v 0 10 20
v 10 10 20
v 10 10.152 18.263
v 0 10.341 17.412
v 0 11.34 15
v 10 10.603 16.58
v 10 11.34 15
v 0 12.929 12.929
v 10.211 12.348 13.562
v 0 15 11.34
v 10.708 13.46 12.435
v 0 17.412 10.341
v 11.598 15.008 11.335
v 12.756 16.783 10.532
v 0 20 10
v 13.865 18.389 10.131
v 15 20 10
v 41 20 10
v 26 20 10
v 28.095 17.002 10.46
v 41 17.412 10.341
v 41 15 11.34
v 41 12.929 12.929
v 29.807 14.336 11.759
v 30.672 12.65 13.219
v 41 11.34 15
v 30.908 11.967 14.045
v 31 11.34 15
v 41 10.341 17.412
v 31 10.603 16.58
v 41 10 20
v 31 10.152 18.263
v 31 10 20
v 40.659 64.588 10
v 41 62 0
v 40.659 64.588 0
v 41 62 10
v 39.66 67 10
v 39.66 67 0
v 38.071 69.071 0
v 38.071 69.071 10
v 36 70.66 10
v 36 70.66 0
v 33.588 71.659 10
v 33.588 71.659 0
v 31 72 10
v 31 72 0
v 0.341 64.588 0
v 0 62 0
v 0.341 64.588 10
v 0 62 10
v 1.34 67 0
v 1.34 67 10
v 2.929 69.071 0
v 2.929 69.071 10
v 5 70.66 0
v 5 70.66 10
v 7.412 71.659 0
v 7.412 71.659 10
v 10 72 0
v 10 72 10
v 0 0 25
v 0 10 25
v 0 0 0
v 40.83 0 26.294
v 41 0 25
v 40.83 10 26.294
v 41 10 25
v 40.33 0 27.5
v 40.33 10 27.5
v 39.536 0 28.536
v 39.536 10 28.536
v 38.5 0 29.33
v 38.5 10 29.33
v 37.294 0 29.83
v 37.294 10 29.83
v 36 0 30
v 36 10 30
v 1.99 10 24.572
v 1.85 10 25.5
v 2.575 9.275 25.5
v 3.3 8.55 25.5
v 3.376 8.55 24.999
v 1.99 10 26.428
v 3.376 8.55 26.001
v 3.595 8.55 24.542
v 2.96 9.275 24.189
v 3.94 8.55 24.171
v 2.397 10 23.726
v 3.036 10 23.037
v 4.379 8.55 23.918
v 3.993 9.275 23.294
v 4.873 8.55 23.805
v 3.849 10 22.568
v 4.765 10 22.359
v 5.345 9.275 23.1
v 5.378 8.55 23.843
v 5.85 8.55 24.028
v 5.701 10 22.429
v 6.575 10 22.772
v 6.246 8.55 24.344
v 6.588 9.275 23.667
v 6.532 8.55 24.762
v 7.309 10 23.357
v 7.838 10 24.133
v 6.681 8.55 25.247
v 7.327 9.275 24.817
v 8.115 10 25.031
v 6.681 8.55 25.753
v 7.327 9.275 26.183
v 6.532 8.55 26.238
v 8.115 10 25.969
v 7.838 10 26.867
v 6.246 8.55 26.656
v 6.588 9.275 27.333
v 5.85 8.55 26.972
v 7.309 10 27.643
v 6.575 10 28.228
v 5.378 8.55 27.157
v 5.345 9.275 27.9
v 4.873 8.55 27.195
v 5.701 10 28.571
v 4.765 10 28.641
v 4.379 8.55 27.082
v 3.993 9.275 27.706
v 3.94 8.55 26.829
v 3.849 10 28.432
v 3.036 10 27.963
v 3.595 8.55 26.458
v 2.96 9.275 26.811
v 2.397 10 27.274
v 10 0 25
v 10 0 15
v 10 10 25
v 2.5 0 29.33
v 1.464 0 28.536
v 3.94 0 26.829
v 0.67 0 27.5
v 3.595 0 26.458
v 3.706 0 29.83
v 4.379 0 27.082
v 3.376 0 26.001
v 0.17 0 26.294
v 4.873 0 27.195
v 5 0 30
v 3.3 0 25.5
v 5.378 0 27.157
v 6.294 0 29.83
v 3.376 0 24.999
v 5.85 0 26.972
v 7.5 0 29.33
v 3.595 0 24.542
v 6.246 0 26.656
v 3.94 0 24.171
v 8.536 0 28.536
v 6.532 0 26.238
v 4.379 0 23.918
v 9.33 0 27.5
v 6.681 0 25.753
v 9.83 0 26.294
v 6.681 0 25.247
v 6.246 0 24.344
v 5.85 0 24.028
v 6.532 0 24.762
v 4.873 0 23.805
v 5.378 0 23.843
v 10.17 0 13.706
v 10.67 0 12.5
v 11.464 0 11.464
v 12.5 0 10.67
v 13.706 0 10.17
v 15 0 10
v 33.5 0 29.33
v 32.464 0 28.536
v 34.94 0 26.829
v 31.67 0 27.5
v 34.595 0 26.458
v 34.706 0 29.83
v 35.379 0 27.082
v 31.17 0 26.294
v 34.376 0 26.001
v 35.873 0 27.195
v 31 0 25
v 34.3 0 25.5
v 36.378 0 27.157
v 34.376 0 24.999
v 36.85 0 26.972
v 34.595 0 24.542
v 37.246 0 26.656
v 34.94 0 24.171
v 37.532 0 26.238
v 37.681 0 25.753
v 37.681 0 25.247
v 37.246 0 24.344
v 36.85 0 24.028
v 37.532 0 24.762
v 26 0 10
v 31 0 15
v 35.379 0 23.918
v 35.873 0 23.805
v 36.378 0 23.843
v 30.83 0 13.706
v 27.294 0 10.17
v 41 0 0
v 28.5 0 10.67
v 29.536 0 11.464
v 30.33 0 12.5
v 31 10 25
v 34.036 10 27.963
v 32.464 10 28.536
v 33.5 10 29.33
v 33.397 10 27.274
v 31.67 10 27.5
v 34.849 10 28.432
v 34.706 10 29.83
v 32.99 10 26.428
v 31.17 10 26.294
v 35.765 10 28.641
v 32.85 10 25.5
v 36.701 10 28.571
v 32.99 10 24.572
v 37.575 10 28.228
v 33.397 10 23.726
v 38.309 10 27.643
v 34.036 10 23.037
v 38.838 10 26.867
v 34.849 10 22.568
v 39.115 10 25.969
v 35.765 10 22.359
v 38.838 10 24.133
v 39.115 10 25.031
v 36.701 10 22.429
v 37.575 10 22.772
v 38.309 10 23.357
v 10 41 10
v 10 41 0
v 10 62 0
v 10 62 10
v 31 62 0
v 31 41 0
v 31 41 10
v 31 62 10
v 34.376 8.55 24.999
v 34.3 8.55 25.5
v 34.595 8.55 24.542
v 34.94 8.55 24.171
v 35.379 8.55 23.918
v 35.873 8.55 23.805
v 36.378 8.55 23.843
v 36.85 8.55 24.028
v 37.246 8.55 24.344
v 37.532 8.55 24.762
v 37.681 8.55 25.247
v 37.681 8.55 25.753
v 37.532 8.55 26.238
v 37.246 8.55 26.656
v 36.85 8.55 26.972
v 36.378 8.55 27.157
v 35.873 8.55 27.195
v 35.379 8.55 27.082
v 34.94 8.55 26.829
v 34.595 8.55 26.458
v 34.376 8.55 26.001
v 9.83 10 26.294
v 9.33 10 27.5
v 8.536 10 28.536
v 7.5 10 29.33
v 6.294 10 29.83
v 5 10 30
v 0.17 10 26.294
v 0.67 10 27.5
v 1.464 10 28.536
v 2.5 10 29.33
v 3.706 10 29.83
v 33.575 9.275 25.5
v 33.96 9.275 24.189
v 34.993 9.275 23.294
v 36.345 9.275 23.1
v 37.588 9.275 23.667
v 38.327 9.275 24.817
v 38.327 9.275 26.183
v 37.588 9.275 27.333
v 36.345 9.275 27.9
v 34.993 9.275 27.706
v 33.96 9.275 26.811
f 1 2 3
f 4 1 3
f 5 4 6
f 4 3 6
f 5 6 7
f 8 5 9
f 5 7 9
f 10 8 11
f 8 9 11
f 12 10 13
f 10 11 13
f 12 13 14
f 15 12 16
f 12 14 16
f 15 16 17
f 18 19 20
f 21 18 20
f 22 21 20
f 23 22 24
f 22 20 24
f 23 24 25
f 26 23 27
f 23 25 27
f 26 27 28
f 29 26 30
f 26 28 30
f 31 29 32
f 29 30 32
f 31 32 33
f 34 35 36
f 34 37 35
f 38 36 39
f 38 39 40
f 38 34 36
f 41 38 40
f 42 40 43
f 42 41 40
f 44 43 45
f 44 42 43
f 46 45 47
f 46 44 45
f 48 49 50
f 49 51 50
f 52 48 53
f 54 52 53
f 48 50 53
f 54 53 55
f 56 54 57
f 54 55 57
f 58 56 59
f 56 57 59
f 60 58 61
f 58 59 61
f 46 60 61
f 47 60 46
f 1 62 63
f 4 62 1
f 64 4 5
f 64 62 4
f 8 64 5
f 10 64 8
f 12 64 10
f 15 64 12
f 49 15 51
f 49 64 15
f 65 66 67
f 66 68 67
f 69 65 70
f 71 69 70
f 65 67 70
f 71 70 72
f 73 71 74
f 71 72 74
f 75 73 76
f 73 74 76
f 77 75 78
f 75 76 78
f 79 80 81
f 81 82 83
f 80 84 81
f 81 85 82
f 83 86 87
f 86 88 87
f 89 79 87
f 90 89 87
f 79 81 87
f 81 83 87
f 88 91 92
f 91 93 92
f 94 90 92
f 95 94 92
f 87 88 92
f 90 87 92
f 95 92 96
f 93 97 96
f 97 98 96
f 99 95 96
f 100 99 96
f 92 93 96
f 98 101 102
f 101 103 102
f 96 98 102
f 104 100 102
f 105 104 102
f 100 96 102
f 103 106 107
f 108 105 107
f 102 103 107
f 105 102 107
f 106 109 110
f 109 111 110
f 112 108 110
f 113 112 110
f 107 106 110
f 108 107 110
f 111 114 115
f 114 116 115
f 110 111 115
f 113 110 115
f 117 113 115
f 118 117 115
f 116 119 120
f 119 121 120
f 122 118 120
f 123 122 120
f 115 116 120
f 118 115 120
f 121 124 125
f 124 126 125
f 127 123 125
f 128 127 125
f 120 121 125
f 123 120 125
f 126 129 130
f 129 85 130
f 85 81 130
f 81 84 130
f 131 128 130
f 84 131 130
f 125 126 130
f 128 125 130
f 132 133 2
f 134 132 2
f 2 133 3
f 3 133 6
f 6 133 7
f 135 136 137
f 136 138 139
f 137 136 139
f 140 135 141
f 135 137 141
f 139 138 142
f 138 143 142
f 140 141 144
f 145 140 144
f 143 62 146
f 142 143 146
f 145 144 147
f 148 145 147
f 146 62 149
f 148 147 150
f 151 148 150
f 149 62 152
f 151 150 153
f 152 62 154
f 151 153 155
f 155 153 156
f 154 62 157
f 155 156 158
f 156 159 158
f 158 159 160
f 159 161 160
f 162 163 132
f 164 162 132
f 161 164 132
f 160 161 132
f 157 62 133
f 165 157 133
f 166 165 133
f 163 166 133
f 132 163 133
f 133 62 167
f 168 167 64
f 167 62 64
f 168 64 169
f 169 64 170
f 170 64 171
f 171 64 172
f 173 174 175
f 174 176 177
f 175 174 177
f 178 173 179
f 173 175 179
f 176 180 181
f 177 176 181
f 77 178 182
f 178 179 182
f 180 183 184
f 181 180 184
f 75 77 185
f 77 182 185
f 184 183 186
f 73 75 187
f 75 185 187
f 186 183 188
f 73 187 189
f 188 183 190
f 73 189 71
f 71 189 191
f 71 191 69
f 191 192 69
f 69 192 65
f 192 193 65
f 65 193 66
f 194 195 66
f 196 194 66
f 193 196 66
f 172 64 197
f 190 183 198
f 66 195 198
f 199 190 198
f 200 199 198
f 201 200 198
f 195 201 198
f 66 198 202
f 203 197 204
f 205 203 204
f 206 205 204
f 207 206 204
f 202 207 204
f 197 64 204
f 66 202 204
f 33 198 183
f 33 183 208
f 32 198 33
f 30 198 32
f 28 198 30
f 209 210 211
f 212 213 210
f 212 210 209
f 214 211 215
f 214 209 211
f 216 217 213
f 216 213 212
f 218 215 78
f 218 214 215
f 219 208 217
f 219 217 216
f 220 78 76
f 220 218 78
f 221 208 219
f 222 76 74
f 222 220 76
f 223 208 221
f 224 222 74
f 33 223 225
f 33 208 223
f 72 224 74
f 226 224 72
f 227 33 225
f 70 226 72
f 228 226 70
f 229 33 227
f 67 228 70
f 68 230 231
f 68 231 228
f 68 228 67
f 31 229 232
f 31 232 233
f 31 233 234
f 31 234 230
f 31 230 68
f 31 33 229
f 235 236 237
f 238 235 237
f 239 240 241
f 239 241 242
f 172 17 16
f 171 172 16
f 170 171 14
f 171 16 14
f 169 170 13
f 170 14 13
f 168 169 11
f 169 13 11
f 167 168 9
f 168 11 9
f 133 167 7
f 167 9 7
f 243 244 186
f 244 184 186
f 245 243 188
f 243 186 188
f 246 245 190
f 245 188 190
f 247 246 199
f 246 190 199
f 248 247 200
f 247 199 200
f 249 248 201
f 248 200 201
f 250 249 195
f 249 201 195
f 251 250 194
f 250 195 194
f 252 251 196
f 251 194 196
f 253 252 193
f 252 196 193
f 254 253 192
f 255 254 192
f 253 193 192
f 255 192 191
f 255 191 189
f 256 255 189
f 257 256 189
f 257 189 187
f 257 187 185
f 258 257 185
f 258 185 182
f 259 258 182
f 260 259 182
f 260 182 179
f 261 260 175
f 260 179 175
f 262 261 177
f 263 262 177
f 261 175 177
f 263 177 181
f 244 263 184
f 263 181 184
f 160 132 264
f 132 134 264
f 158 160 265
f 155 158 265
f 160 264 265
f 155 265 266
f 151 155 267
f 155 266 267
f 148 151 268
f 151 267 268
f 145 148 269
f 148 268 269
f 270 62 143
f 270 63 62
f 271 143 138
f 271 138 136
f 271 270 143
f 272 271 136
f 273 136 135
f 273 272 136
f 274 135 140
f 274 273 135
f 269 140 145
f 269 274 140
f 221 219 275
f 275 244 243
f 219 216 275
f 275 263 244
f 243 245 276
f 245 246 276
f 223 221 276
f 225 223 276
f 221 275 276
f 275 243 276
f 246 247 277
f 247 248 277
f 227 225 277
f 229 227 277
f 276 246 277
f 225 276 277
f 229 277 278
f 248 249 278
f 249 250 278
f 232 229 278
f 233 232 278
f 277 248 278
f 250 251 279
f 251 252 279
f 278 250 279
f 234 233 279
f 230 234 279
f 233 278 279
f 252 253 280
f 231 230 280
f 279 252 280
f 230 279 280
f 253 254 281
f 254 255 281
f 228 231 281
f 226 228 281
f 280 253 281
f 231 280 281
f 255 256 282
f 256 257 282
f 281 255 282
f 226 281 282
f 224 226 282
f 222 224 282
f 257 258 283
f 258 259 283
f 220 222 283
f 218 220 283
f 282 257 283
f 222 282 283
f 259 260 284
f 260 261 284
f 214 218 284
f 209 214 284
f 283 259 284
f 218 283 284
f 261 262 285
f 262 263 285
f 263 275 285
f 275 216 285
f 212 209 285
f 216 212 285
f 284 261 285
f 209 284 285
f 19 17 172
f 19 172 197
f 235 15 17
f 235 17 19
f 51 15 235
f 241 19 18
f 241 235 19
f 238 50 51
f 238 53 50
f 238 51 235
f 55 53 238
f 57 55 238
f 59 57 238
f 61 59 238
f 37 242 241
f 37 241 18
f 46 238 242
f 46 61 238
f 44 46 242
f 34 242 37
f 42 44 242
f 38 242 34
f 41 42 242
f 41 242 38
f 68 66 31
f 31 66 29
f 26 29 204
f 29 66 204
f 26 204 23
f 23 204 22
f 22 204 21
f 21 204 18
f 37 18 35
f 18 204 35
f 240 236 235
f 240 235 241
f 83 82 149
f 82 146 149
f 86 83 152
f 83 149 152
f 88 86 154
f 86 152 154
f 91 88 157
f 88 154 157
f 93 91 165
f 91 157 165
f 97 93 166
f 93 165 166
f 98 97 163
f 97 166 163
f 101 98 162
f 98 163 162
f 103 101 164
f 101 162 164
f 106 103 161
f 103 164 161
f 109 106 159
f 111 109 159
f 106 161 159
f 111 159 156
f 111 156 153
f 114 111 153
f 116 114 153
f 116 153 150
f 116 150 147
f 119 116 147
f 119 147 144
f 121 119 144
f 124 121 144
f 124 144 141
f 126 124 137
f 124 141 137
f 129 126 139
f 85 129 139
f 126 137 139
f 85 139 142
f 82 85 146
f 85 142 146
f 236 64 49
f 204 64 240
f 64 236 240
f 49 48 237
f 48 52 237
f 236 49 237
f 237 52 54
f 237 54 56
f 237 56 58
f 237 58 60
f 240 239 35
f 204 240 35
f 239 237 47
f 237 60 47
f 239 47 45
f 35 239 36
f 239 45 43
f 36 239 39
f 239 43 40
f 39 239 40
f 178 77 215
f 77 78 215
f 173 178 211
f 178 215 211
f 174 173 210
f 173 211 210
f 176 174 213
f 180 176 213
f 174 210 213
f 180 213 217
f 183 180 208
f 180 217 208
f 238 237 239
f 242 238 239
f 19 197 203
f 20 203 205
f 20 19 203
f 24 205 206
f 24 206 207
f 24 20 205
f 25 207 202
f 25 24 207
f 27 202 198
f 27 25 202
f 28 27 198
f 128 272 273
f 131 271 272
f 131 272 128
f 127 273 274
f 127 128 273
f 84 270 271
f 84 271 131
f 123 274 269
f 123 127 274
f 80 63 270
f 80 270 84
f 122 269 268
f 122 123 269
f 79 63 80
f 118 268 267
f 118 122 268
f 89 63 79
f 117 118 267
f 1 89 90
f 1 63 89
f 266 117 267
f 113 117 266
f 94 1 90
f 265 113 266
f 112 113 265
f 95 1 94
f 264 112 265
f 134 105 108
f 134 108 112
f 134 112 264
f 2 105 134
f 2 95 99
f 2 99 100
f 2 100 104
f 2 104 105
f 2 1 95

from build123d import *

# Parameters (mm, degrees)
ESQUISSE1_W                                    = 41
ESQUISSE1_H                                    = 72
ESQUISSE1_W_2                                  = 21
ESQUISSE1_H_2                                  = 21
BOSS_EXTRU_1_DEPTH                             = 10
ESQUISSE3_W                                    = 10
ESQUISSE3_H                                    = 10
BOSS_EXTRU_2_DEPTH                             = 20
FRAISAGE_POUR_VIS_T_TE_FRAIS_E_M31_D           = 3.4
FRAISAGE_POUR_VIS_T_TE_FRAIS_E_M31_CSINK_D     = 6.3
FRAISAGE_POUR_VIS_T_TE_FRAIS_E_M31_CSINK_ANGLE = 90
CONG_2_R                                       = 10
CONG_3_R                                       = 5
CONG_4_R                                       = 10


with BuildPart() as part:
    # Esquisse1 → Boss.-Extru.1 (new body)
    with BuildSketch(Plane.XY):
        with Locations((20.5, 36)):
            Rectangle(ESQUISSE1_W, ESQUISSE1_H)
        with Locations((20.5, 51.5)):
            Rectangle(ESQUISSE1_W_2, ESQUISSE1_H_2, mode=Mode.SUBTRACT)
    extrude(amount=BOSS_EXTRU_1_DEPTH)

    # Esquisse3 → Boss.-Extru.2 (add)
    with BuildSketch(Plane.XY.offset(10)):
        with Locations((36, 5)):
            Rectangle(ESQUISSE3_W, ESQUISSE3_H)
        with Locations((5, 5)):
            Rectangle(ESQUISSE3_W, ESQUISSE3_H)
    extrude(amount=BOSS_EXTRU_2_DEPTH)

    # Fraisage pour vis à tête fraisée M31 (through all)
    with Locations(Plane(origin=(0, 10, 0), x_dir=(1, 0, 0), z_dir=(0, 1, 0))):
        with Locations((5, -25.5), (36, -25.5)):
            CounterSinkHole(FRAISAGE_POUR_VIS_T_TE_FRAIS_E_M31_D / 2, FRAISAGE_POUR_VIS_T_TE_FRAIS_E_M31_CSINK_D / 2, counter_sink_angle=FRAISAGE_POUR_VIS_T_TE_FRAIS_E_M31_CSINK_ANGLE)

    # Congé2
    cong_2_edges = [part.edges().sort_by_distance(p)[0] for p in [
        (0, 72, 5),
        (41, 72, 5),
    ]]
    fillet(cong_2_edges, radius=CONG_2_R)

    # Congé3
    cong_3_edges = [part.edges().sort_by_distance(p)[0] for p in [
        (10, 5, 10),
        (31, 5, 10),
        (41, 5, 30),
        (31, 5, 30),
        (10, 5, 30),
        (0, 5, 30),
    ]]
    fillet(cong_3_edges, radius=CONG_3_R - 0.0001)  # a hair under: the kernel refuses the full size

    # Congé4
    cong_4_edges = [part.edges().sort_by_distance(p)[0] for p in [
        (33.50005, 10, 10),
        (7.49995, 10, 10),
    ]]
    fillet(cong_4_edges, radius=CONG_4_R)


solid = part.part
